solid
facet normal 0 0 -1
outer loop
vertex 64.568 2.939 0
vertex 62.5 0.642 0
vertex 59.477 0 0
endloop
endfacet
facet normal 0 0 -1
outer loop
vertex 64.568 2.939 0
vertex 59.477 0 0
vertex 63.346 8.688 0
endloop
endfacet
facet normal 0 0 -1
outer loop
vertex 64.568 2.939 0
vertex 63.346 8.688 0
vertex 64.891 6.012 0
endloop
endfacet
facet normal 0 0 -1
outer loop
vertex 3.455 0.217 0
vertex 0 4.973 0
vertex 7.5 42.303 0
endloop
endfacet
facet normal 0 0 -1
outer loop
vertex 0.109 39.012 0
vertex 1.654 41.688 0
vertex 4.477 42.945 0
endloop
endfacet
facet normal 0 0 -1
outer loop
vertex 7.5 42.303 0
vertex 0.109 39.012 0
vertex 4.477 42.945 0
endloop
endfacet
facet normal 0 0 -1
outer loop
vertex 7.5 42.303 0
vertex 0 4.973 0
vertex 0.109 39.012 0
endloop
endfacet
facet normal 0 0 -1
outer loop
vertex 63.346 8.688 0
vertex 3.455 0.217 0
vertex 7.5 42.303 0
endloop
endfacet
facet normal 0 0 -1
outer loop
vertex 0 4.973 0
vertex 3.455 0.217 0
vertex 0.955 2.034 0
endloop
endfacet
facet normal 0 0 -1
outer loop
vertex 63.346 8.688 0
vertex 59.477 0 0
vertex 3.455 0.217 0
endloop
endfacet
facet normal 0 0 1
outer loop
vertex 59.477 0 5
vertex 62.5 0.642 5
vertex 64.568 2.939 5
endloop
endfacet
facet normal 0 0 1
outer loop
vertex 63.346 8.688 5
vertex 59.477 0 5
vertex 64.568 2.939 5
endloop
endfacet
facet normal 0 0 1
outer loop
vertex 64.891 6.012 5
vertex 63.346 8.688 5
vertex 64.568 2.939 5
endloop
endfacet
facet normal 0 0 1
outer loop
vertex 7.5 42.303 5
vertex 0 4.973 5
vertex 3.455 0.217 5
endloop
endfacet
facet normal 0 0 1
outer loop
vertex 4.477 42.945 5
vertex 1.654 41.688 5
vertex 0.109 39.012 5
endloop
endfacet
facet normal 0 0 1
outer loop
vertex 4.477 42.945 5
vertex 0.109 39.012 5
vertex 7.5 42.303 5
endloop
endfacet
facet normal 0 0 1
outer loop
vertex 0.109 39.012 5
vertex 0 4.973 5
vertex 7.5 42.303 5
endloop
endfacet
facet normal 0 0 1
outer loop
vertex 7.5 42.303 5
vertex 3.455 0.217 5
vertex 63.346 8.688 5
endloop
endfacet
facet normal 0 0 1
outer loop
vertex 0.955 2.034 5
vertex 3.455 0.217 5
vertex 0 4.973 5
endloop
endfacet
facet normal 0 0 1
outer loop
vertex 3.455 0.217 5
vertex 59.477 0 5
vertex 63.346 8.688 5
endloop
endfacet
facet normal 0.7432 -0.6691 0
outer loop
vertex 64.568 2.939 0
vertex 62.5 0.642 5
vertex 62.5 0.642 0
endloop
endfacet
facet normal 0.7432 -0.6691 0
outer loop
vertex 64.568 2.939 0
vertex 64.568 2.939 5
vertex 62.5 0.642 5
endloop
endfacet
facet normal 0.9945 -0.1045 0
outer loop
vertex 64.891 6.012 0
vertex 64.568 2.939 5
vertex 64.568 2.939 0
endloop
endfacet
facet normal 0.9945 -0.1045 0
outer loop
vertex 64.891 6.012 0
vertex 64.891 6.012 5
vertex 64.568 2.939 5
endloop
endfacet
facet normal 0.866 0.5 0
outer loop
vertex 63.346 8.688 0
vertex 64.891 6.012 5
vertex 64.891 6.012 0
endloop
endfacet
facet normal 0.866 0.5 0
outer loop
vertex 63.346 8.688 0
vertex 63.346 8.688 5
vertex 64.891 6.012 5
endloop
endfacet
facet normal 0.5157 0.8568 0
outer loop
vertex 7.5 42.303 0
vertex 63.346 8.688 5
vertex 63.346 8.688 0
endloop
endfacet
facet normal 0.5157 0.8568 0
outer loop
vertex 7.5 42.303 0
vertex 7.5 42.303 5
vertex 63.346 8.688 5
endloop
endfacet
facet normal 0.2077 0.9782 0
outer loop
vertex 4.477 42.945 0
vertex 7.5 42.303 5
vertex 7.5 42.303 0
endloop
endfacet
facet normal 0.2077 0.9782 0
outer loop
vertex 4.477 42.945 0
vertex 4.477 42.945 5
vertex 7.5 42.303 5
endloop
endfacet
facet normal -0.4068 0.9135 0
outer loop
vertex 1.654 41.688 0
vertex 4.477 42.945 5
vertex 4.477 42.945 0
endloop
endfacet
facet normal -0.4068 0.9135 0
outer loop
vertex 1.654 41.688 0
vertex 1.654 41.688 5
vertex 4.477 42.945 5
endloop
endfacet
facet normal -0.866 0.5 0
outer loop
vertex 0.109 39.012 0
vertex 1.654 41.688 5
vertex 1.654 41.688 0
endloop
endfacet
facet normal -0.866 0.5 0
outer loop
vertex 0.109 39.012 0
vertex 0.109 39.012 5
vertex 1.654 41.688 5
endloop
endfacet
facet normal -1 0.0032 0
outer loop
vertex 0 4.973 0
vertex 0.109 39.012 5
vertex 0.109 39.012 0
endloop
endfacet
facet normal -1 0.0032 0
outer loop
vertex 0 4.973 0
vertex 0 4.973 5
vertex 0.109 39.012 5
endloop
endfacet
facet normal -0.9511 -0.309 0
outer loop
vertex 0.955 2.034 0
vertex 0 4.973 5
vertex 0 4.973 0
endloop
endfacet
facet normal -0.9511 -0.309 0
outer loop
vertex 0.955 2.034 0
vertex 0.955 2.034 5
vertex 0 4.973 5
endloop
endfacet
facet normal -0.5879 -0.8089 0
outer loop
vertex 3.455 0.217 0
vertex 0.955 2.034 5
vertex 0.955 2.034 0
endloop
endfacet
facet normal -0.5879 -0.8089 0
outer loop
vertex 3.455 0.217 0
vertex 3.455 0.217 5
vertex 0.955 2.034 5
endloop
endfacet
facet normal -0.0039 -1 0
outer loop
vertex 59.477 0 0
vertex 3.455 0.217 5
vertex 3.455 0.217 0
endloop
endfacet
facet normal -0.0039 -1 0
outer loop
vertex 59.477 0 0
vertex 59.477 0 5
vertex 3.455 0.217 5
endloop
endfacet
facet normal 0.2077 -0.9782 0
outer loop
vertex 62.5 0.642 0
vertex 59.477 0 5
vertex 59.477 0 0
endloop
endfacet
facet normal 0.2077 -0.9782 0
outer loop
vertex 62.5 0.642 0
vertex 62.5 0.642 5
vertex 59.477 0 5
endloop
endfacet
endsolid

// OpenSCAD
$fn = 32;

// ----------------------------------------------------------------------
// Lever arm: two bosses 10 and 10 mm, 55 mm between centres
// ----------------------------------------------------------------------

// --- parameters (mm) ---
profile_height = 5;       // extrusion height
profile_points = 12;      // points of the closed outline

profile = [[0, 4.973], [0.955, 2.034], [3.455, 0.217], [59.477, 0], [62.5, 0.642], [64.568, 2.939], [64.891, 6.012], [63.346, 8.688], [7.5, 42.303], [4.477, 42.945], [1.654, 41.688], [0.109, 39.012]];  // single closed polygon, 12 points, counter clockwise

// --- the one profile operation ---
linear_extrude(height = profile_height) polygon(points = profile);
